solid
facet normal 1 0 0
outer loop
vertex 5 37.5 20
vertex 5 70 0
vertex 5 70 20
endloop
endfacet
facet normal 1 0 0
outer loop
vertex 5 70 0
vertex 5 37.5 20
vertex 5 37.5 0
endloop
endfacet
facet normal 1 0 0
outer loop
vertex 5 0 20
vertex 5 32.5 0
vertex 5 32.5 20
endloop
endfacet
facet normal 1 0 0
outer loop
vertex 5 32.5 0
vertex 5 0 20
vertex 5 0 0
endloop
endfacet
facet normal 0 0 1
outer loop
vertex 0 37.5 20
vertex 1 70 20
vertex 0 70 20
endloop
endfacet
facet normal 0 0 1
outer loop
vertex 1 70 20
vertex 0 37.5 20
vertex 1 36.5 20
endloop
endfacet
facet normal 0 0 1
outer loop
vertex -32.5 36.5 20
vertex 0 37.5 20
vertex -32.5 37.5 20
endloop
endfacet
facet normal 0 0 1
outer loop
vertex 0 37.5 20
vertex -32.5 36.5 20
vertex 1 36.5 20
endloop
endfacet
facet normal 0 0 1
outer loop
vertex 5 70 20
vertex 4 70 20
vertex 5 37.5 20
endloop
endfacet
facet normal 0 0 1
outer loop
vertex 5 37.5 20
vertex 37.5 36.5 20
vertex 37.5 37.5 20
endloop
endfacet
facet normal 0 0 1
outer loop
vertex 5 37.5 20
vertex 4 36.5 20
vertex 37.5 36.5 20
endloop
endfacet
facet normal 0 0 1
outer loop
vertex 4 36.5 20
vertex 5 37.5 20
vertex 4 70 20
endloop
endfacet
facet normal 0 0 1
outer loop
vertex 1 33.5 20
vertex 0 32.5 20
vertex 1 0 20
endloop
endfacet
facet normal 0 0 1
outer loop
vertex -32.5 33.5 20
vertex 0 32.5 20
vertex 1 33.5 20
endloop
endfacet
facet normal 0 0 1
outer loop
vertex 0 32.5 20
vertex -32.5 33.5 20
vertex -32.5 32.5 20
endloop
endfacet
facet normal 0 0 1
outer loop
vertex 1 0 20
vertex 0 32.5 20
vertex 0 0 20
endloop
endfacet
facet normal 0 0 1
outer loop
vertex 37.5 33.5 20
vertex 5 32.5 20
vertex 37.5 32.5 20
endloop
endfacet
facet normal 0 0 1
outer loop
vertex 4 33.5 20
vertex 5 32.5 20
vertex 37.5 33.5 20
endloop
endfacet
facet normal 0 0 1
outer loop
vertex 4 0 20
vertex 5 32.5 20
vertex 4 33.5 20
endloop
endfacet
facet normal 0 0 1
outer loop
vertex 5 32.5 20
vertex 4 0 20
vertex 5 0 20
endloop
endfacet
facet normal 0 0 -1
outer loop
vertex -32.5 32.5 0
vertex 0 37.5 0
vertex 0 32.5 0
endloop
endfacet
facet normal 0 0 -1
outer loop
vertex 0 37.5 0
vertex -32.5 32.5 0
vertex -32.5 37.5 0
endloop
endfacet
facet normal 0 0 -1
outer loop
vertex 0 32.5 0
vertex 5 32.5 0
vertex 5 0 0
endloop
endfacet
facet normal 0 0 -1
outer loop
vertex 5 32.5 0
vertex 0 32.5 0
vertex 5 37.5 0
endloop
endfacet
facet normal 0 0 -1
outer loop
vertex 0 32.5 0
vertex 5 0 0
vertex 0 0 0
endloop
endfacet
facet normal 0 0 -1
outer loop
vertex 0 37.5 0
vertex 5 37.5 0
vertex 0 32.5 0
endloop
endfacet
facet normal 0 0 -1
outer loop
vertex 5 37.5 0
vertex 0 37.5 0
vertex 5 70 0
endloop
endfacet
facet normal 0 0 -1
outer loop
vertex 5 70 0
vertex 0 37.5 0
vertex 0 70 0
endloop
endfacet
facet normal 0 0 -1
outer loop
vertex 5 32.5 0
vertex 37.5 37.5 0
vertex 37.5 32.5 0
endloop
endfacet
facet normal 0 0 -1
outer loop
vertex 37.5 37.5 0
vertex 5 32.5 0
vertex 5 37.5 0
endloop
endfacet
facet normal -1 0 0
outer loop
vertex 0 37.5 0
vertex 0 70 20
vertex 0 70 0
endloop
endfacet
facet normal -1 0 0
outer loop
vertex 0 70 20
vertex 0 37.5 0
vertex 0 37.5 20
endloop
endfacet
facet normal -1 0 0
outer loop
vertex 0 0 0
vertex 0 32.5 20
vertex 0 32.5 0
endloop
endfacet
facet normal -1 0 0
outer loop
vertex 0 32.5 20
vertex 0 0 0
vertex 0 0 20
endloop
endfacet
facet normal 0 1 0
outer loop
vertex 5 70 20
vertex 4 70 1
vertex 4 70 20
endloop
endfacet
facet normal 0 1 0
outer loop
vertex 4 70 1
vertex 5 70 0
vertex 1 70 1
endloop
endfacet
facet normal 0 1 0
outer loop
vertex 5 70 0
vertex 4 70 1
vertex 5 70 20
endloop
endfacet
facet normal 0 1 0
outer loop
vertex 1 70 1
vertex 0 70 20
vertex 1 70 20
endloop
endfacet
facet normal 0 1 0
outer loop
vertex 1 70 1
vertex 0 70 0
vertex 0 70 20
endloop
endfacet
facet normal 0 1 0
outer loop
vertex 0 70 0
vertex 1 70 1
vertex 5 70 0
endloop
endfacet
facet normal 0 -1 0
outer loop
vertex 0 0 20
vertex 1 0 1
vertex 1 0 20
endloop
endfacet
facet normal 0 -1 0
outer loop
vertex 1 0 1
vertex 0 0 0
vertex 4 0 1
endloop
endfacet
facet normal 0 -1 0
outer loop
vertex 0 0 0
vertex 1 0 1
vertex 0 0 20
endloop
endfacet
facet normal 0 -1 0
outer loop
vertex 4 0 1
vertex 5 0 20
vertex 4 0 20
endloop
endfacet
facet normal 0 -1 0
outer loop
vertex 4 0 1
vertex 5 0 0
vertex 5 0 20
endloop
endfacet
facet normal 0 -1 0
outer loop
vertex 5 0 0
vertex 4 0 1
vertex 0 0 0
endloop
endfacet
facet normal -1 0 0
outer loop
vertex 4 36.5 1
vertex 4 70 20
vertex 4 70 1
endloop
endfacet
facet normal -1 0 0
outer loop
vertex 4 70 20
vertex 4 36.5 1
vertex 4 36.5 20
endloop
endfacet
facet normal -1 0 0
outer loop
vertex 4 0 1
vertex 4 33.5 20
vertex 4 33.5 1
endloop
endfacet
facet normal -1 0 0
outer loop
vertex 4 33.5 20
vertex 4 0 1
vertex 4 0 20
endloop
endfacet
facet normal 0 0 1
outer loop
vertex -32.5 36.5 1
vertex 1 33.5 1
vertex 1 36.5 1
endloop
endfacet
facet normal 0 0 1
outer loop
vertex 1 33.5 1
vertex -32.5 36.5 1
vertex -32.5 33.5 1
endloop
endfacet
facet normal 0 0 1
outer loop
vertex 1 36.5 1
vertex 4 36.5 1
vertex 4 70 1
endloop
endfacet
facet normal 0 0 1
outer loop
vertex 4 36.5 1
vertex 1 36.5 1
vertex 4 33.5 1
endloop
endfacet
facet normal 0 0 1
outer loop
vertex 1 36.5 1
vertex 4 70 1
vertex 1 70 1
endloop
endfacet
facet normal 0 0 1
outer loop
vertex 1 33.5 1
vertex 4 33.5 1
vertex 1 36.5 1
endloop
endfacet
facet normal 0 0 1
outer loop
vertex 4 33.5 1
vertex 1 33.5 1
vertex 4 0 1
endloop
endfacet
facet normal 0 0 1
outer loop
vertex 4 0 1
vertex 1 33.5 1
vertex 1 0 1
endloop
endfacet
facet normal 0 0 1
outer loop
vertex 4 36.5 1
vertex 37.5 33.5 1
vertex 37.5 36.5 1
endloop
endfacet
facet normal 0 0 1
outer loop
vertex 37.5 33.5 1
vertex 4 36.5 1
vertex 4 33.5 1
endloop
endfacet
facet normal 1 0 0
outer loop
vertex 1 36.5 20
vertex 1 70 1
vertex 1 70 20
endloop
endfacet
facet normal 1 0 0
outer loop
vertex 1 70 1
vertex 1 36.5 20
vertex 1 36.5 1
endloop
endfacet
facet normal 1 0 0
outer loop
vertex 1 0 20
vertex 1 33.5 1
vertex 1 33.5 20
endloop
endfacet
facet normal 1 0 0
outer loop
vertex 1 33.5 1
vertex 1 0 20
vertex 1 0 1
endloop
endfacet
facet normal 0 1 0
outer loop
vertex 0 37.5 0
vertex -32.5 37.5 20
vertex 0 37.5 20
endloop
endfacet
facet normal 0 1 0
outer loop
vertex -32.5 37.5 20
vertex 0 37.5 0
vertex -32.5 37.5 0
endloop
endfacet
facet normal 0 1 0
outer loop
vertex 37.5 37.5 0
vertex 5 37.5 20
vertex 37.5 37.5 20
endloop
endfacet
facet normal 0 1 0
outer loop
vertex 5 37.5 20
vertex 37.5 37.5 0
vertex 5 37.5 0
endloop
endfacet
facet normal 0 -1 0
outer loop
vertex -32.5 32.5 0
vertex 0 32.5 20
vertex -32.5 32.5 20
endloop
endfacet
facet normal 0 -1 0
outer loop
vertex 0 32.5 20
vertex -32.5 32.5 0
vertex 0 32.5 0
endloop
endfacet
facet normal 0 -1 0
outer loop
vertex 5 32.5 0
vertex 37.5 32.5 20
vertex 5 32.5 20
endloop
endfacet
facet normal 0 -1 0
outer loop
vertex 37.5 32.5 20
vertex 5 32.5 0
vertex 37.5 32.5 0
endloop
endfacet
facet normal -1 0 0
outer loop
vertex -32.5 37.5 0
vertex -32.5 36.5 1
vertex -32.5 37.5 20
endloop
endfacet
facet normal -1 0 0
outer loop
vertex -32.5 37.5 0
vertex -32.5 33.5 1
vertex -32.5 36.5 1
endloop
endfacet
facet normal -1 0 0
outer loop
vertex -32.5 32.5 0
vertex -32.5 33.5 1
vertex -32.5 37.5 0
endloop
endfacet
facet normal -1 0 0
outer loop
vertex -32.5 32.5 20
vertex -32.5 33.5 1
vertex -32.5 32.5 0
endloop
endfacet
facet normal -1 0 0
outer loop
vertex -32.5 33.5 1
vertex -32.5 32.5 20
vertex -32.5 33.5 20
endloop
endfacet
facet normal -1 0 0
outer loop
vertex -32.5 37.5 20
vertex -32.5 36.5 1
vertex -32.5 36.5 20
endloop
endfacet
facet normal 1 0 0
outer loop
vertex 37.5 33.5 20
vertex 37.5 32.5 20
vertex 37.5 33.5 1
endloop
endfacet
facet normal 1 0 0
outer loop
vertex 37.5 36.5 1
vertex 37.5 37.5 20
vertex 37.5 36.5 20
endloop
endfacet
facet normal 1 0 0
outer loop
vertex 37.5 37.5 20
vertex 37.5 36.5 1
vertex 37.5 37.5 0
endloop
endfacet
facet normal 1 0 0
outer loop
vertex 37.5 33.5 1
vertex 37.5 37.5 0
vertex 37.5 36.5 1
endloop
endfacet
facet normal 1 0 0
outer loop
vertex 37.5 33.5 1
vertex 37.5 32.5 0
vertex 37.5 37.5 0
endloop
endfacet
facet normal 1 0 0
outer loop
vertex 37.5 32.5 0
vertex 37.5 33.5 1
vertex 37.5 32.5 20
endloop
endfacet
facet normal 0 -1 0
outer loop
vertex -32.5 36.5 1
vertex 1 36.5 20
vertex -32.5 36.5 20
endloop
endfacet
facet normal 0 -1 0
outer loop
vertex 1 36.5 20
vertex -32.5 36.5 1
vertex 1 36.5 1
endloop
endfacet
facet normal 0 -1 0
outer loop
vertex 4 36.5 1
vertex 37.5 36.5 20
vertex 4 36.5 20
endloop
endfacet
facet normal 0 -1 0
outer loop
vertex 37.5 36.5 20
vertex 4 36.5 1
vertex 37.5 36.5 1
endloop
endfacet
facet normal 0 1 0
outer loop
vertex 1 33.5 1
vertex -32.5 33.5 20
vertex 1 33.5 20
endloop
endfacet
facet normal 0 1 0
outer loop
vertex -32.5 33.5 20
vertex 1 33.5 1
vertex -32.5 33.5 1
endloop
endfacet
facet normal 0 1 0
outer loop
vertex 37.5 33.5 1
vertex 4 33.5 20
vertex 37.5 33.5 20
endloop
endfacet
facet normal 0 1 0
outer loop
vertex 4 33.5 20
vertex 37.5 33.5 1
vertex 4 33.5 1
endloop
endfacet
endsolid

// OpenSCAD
w = 5;
d = 70;
h = 20;
delta = 1;

module u(u_w, u_d, u_h, u_delta) {
    cut = 0.5;
    difference() {
        cube([u_w,u_d,u_h]);
        translate([u_delta,-cut,u_delta]) cube([u_w - u_delta * 2,u_d + cut * 2,u_h - u_delta + cut]);
    }
}

difference() {
    union() {
        u(w,d,h, delta);
        translate([d/2 + w/2,d/2 - w/2,0]) rotate([0,0,90]) u(w,d,h, delta);
    }
    translate([-delta , d/2 - delta*1.5, delta ]) color("red") cube([w + delta * 2,w - delta *2 ,h + 1]);
    translate([delta, d/2 - delta * 4, delta]) color("blue") cube([w - delta * 2,w + delta *2 ,h + 1]);
}
